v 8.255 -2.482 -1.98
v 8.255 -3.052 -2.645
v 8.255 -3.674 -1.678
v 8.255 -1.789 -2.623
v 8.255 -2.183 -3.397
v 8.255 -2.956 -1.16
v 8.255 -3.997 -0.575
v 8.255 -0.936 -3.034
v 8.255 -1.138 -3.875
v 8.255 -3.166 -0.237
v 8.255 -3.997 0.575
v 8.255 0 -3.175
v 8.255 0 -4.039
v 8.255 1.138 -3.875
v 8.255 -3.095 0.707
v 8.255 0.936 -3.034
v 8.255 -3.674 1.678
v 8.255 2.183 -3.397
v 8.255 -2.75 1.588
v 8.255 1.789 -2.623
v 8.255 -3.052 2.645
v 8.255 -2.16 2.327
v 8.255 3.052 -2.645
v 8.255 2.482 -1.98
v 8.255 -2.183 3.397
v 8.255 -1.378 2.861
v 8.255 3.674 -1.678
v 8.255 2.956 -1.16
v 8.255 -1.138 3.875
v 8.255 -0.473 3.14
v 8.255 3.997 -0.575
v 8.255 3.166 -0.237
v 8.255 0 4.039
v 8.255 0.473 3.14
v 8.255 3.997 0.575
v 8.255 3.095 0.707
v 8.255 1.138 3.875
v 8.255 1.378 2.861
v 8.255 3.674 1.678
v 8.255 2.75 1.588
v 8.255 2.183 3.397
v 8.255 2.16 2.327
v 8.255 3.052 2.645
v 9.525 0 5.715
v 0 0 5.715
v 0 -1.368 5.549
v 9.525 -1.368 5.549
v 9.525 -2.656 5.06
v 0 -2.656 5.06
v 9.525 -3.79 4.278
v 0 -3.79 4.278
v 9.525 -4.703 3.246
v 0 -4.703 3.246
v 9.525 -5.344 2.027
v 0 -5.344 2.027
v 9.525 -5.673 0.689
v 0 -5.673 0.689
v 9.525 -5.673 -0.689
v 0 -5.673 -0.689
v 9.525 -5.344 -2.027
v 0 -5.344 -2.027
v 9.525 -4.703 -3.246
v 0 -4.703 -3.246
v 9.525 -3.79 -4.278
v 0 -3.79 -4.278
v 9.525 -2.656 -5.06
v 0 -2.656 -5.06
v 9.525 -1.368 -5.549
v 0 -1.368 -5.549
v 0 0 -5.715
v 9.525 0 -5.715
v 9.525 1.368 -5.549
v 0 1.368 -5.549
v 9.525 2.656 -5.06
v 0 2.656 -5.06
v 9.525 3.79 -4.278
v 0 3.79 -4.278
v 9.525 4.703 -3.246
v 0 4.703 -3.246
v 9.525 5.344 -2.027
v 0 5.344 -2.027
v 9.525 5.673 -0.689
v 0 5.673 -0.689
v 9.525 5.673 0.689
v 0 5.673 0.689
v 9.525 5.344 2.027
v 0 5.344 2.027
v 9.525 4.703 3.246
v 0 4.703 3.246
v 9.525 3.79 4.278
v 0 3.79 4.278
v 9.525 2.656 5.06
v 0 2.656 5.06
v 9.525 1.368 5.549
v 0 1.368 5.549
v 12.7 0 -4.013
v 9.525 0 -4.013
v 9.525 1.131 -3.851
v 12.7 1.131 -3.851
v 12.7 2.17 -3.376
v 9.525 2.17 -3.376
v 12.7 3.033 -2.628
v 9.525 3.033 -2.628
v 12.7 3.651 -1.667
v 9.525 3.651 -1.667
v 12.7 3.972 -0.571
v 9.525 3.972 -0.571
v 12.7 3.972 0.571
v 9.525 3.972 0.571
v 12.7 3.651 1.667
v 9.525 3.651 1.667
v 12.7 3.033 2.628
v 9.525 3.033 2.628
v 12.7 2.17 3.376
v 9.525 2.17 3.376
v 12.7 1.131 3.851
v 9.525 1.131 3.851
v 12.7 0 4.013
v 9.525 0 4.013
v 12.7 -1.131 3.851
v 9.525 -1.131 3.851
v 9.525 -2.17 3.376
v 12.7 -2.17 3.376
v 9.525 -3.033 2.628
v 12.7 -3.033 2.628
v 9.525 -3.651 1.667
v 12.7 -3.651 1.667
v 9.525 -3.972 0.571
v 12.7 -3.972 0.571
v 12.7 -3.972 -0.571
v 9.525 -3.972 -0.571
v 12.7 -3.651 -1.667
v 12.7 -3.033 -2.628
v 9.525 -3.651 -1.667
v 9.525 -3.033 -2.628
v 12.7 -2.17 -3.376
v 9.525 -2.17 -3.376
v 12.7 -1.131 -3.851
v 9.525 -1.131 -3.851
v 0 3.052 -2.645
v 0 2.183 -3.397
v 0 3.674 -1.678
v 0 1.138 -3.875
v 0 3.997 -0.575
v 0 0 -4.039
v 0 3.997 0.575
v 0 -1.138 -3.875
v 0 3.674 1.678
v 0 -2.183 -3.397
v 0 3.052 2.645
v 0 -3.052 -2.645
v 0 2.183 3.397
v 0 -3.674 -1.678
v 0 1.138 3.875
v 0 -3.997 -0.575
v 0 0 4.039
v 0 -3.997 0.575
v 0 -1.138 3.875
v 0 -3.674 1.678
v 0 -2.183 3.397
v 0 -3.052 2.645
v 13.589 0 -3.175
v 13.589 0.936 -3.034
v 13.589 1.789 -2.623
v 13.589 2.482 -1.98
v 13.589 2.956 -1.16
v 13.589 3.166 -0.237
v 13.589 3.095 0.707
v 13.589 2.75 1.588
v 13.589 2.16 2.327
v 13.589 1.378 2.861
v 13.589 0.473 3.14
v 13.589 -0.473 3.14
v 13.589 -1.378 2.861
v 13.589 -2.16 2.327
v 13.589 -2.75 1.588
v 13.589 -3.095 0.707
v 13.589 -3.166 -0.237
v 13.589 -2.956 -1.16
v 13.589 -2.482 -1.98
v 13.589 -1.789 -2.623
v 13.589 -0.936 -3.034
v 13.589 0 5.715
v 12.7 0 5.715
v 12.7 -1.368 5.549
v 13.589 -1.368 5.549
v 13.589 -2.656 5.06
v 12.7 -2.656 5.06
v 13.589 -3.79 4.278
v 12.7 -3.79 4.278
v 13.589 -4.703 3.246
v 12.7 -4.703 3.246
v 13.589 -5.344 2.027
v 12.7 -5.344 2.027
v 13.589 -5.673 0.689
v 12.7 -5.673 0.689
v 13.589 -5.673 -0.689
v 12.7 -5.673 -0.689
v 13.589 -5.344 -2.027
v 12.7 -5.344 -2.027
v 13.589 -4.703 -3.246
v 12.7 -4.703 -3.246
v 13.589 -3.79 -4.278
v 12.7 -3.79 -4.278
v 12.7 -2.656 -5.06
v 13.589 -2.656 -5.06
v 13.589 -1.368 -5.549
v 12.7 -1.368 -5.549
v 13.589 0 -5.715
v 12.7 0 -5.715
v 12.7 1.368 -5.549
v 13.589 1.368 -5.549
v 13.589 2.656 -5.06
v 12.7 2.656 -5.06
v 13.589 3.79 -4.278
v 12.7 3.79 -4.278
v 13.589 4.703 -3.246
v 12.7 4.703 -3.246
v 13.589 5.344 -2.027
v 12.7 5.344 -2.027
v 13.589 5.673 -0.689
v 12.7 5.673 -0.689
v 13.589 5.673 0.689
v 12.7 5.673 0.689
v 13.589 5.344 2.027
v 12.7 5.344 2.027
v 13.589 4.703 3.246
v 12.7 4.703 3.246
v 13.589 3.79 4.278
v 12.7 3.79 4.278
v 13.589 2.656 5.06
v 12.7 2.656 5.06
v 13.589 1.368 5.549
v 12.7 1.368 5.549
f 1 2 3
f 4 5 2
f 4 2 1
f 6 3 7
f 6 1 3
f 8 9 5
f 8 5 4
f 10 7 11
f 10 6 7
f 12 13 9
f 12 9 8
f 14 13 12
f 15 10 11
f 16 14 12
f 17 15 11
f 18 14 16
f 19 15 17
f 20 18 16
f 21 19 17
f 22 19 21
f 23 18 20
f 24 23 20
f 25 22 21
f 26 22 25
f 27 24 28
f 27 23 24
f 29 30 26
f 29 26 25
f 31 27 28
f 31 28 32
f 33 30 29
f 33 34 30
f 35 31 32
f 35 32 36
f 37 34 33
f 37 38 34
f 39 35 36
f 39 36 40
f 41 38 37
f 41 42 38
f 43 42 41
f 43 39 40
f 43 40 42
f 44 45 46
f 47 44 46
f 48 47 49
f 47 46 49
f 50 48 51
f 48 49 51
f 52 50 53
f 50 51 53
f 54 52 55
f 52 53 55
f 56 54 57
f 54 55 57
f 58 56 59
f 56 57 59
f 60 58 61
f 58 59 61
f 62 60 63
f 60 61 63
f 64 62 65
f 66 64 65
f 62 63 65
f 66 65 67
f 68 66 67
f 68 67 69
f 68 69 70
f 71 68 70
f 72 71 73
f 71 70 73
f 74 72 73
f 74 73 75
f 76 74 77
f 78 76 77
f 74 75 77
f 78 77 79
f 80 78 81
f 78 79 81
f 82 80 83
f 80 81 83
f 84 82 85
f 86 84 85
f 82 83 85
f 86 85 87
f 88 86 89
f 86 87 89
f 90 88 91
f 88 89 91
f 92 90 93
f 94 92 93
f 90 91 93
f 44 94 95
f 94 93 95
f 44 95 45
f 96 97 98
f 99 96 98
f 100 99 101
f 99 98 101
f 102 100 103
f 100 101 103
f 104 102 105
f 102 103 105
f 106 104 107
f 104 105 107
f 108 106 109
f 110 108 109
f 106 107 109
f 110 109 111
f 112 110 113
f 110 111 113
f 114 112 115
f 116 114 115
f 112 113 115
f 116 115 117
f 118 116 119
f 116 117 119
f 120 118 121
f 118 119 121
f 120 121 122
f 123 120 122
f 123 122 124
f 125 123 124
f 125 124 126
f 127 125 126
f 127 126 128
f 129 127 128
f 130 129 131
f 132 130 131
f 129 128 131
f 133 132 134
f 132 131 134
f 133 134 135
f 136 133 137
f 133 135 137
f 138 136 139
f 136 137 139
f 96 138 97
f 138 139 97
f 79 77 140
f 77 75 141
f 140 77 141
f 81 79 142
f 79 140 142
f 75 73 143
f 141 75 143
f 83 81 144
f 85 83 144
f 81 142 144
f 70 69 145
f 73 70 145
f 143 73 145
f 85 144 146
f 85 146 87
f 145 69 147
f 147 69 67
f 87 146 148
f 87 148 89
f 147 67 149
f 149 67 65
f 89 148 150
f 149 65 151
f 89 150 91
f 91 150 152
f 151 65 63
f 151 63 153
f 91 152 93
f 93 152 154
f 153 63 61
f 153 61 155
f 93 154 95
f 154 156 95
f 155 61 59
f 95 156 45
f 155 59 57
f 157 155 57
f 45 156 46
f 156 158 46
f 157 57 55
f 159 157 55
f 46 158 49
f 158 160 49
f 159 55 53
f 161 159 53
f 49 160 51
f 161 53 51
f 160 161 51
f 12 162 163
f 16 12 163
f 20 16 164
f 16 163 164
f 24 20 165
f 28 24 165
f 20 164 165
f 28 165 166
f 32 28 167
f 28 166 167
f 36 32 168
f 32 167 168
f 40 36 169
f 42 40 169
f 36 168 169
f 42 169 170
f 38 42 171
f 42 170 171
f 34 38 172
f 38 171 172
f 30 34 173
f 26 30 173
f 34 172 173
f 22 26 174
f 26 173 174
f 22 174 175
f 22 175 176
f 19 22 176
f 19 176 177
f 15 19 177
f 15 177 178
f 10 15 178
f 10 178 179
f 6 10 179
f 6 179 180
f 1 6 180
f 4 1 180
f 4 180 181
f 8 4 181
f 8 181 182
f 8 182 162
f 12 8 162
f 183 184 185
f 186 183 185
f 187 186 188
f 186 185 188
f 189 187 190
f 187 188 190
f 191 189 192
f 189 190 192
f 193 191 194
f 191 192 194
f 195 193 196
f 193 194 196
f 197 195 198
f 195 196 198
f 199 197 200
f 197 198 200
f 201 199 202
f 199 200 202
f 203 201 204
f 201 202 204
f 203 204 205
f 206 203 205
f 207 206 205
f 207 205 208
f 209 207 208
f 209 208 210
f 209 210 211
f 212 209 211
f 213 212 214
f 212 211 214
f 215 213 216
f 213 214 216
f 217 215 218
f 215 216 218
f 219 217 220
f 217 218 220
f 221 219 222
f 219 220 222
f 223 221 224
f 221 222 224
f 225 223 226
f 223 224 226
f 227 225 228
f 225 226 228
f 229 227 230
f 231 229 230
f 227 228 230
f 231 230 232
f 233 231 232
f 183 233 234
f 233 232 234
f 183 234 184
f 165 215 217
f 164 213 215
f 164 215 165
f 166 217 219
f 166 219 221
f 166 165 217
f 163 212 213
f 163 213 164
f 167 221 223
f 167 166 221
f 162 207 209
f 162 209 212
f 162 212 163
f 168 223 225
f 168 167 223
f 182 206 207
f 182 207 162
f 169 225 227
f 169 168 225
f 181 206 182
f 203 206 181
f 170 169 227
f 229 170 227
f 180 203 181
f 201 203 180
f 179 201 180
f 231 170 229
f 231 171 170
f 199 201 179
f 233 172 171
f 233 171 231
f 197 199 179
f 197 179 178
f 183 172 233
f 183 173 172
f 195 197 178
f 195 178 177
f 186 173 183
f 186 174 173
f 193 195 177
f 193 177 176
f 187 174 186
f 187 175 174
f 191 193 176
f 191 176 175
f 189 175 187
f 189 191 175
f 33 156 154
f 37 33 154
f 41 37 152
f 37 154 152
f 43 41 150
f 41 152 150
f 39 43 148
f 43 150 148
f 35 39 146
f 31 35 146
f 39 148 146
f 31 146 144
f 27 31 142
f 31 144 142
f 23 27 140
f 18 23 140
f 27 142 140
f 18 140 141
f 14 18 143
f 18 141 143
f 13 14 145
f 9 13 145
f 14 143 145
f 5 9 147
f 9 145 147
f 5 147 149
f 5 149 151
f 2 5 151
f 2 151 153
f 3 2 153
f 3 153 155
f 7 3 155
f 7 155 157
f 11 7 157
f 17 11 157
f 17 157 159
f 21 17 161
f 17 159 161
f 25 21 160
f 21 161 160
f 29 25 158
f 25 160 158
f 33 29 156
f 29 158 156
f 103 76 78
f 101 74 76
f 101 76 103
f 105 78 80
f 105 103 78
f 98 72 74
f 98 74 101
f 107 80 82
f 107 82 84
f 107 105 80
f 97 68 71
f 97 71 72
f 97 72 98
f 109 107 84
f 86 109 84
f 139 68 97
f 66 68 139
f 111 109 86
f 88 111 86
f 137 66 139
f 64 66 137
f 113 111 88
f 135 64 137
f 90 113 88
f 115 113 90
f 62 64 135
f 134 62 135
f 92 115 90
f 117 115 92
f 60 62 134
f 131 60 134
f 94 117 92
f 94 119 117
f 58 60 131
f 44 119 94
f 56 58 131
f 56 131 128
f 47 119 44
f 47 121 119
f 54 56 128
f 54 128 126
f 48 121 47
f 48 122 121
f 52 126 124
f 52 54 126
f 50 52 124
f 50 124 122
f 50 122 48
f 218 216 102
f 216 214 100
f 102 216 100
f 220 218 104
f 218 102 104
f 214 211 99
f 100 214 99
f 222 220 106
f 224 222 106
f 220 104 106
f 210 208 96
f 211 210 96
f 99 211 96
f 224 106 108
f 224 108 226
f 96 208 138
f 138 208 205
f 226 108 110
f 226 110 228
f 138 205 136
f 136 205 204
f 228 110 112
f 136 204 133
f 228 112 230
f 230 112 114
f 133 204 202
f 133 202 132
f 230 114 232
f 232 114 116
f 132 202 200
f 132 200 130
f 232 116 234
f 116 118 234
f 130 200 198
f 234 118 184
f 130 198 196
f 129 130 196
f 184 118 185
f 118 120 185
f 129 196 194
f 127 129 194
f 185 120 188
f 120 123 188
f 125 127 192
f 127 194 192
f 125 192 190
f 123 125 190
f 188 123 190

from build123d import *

# Parameters (mm, degrees)
SKETCH1_R           = 5.715
BOSS_EXTRUDE1_DEPTH = 9.525
SKETCH2_R           = 4.0132
BOSS_EXTRUDE2_DEPTH = 3.175
SKETCH3_R           = 5.715
BOSS_EXTRUDE3_DEPTH = 0.889
SKETCH4_R           = 3.175
CUT_EXTRUDE1_DEPTH  = 16.810862437
SKETCH5_R           = 4.0386
CUT_EXTRUDE2_DEPTH  = 8.255


with BuildPart() as part:
    # Sketch1 → Boss-Extrude1 (new body)
    with BuildSketch(Plane(origin=(0, 0, 0), x_dir=(0, 0, -1), z_dir=(1, 0, 0))):
        with Locations(Location((0, 0, 0), (0, 0, 180))):
            Circle(SKETCH1_R)
    extrude(amount=BOSS_EXTRUDE1_DEPTH)

    # Sketch2 → Boss-Extrude2 (add)
    with BuildSketch(Plane(origin=(9.525, 0, 0), x_dir=(0, 0, -1), z_dir=(1, 0, 0))):
        Circle(SKETCH2_R)
    extrude(amount=BOSS_EXTRUDE2_DEPTH)

    # Sketch3 → Boss-Extrude3 (add)
    with BuildSketch(Plane(origin=(12.7, 0, 0), x_dir=(0, 0, -1), z_dir=(1, 0, 0))):
        with Locations(Location((0, 0, 0), (0, 0, 180))):
            Circle(SKETCH3_R)
    extrude(amount=BOSS_EXTRUDE3_DEPTH)

    # Sketch4 → Cut-Extrude1 (cut, through all)
    with BuildSketch(Plane(origin=(13.589, 0, 0), x_dir=(0, 0, -1), z_dir=(1, 0, 0))):
        Circle(SKETCH4_R)
    extrude(amount=-CUT_EXTRUDE1_DEPTH, mode=Mode.SUBTRACT)

    # Sketch5 → Cut-Extrude2 (cut)
    with BuildSketch(Plane.ZY):
        Circle(SKETCH5_R)
    extrude(amount=-CUT_EXTRUDE2_DEPTH, mode=Mode.SUBTRACT)


solid = part.part
